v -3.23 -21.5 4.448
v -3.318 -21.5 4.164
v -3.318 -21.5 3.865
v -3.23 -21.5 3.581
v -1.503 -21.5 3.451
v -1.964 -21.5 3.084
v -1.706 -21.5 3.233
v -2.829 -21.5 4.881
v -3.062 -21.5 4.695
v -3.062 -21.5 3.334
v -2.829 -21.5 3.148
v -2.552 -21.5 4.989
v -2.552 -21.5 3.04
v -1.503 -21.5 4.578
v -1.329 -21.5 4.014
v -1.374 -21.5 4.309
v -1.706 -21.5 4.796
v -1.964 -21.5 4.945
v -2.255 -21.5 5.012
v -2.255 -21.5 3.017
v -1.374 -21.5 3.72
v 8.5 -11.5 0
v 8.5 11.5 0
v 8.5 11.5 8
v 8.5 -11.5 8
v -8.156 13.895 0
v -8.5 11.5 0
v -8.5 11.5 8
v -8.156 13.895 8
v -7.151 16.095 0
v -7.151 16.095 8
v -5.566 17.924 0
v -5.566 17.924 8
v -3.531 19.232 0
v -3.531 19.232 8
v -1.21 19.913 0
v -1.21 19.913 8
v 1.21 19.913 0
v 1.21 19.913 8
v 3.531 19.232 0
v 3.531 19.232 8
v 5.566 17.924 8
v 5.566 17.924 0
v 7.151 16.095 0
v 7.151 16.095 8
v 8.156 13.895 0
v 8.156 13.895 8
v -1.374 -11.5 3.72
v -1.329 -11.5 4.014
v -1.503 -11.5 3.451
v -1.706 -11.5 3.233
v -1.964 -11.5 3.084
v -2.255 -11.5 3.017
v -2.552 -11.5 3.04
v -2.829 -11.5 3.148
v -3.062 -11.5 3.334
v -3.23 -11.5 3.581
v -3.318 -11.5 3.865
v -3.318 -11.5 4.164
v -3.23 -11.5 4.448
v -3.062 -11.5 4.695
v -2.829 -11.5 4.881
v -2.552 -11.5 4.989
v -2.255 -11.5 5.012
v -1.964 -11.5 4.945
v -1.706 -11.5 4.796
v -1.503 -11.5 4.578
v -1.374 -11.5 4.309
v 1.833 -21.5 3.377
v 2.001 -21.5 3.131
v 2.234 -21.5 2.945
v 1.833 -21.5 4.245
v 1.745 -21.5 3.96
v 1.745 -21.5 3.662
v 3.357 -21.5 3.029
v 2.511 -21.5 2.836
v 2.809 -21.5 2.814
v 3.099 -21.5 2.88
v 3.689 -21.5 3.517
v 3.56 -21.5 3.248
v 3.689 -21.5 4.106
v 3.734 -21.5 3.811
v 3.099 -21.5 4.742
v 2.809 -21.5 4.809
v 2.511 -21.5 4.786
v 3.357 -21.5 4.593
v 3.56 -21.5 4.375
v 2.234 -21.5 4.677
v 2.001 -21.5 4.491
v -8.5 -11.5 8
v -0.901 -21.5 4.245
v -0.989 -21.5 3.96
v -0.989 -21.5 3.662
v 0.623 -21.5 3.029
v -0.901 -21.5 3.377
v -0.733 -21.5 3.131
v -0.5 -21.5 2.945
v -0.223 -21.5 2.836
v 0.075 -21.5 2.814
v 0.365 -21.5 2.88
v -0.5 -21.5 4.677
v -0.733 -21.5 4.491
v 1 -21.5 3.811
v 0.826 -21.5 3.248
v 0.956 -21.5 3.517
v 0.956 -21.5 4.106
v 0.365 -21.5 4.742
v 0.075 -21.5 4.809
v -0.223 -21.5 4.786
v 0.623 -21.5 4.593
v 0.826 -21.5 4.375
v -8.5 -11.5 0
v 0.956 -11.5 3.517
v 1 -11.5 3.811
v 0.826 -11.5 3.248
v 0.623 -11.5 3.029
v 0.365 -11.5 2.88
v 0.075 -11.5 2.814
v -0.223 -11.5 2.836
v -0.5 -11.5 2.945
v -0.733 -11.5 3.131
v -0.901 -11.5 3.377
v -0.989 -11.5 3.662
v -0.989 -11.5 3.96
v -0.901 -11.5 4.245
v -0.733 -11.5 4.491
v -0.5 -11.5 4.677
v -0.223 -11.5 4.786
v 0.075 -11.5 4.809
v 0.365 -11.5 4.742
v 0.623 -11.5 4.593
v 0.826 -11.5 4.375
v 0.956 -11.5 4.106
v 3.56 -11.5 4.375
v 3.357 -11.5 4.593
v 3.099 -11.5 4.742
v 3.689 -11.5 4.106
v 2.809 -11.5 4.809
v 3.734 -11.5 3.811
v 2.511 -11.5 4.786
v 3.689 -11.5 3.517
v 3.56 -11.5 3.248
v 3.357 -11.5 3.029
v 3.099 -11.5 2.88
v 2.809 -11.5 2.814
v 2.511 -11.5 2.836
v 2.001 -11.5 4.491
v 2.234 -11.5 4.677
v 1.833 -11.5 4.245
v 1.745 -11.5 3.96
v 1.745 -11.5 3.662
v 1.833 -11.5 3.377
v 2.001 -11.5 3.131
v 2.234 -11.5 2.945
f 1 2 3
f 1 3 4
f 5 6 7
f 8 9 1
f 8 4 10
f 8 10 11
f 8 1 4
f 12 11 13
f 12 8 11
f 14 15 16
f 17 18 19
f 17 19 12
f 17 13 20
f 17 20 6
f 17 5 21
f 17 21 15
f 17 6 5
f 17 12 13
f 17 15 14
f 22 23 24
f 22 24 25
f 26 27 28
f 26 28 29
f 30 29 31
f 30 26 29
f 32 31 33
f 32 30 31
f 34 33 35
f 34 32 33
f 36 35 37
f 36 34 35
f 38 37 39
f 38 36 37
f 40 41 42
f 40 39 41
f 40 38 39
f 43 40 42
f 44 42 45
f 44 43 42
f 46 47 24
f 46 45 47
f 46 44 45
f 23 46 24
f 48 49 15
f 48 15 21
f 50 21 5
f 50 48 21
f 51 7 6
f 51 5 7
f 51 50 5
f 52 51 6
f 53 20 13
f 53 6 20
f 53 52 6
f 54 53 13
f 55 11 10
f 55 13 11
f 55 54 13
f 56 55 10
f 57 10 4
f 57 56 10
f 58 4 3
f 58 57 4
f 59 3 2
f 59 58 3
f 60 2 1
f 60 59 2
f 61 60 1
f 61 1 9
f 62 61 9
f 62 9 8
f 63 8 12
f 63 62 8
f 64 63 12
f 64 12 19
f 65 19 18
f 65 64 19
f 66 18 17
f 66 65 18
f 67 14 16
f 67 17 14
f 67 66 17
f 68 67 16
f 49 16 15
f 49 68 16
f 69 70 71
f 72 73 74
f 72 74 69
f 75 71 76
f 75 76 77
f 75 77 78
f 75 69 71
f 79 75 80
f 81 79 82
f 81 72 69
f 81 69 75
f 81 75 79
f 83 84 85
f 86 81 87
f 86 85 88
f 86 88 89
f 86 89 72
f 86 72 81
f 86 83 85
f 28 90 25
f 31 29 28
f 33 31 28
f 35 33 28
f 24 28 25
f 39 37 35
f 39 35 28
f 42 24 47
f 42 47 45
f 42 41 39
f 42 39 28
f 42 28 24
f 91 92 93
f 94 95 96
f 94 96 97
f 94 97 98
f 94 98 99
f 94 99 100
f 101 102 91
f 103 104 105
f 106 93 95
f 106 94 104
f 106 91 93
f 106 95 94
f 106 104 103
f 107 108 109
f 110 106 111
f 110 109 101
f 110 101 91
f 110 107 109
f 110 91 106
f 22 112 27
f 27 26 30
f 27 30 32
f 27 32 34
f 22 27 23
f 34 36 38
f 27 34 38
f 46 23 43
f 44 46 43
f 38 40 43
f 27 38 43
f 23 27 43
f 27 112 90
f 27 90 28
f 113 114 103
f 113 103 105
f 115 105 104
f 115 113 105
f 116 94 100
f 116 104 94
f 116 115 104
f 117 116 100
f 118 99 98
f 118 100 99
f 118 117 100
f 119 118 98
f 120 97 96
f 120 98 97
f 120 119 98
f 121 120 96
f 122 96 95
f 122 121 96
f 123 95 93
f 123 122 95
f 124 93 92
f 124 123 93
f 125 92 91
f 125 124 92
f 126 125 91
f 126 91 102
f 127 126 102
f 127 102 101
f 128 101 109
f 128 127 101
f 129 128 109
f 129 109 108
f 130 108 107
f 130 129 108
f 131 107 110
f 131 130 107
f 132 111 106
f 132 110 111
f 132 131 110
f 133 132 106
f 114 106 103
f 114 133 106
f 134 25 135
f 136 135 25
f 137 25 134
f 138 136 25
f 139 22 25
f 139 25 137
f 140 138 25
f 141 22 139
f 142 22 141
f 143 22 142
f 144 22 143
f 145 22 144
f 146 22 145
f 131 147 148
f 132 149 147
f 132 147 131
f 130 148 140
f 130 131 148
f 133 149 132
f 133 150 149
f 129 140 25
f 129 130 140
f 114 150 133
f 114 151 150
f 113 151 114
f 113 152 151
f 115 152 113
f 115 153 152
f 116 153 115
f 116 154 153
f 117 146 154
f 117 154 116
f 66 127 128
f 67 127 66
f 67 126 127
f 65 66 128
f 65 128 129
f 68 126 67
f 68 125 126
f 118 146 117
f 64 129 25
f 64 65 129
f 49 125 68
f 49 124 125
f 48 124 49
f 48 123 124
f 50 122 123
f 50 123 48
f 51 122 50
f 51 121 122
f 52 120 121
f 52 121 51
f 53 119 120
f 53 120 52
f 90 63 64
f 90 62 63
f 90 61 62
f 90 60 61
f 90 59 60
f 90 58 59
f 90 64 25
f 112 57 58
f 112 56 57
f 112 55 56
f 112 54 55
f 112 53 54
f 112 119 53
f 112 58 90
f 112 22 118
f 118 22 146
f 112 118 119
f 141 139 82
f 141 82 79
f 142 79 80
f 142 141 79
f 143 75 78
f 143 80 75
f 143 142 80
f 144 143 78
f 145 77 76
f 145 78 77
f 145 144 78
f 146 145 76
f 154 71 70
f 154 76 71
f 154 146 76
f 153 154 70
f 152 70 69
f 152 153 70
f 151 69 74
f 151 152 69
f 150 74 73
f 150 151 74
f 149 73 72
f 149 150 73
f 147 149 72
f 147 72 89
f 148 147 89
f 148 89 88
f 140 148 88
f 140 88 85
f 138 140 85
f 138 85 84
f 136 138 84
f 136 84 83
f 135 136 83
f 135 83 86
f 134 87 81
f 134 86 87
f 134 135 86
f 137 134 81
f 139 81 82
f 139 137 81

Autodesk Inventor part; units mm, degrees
ref_plane "YZ Plane" through (0, 0, 0) normal (1, 0, 0) x (0, 1, 0)
ref_plane "XZ Plane" through (0, 0, 0) normal (0, 1, 0) x (-1, 0, 0)
ref_plane "XY Plane" through (0, 0, 0) normal (0, 0, 1) x (1, 0, 0)
sketch "Sketch1" plane through (0, 0, 0) normal (0, 0, 1) x (1, 0, 0)
  line L0 (-8.5, 11.5) -> (8.5, 11.5)
  line L1 (8.5, 11.5) -> (8.5, -11.5)
  line L2 (8.5, -11.5) -> (-8.5, -11.5)
  line L3 (-8.5, -11.5) -> (-8.5, 11.5)
  line L4 (-8.5, 11.5) -> (8.5, -11.5) construction
  line L5 (8.5, 11.5) -> (-8.5, -11.5) construction
  arc A0 (8.5, 11.5) -> (-8.5, 11.5) centre (0, 11.5) ccw
  point P0 (0, 0)
  dimension "d0" = 23
  dimension "d1" = 17
extrude "Extrusion1" add sketch "Sketch1" along normal blind 8
sketch "Sketch3" plane through (0, 0, 8) normal (0, 0, 1) x (1, 0, 0)
  line L0 (-8.5, 11.5) -> (-8.5, -11.5) projected
  line L1 (8.5, -11.5) -> (8.5, 11.5) projected
  line L2 (-8.5, 11.5) -> (8.5, 11.5)
  point P0 (0, 0)
sketch "Sketch4" plane through (-8.5, -11.5, 0) normal (0, -1, 0) x (1, 0, 0)
  circle A0 centre (6.1706, 4.0145) radius 1
  circle A1 centre (11.2338, 3.8113) radius 1
  circle A2 centre (8.5, 3.8113) radius 1
  point P0 (8.5, 0)
  dimension "d4" = 2
  dimension "d6" = 2
  dimension "d9" = 2
extrude "Extrusion2" add sketch "Sketch4" along normal blind 10 contours A0 | A1
extrude "Extrusion3" add sketch "Sketch4" along normal blind 10 contours A2
properties part number "temperature sensor" material "Rubber, Silicone"
